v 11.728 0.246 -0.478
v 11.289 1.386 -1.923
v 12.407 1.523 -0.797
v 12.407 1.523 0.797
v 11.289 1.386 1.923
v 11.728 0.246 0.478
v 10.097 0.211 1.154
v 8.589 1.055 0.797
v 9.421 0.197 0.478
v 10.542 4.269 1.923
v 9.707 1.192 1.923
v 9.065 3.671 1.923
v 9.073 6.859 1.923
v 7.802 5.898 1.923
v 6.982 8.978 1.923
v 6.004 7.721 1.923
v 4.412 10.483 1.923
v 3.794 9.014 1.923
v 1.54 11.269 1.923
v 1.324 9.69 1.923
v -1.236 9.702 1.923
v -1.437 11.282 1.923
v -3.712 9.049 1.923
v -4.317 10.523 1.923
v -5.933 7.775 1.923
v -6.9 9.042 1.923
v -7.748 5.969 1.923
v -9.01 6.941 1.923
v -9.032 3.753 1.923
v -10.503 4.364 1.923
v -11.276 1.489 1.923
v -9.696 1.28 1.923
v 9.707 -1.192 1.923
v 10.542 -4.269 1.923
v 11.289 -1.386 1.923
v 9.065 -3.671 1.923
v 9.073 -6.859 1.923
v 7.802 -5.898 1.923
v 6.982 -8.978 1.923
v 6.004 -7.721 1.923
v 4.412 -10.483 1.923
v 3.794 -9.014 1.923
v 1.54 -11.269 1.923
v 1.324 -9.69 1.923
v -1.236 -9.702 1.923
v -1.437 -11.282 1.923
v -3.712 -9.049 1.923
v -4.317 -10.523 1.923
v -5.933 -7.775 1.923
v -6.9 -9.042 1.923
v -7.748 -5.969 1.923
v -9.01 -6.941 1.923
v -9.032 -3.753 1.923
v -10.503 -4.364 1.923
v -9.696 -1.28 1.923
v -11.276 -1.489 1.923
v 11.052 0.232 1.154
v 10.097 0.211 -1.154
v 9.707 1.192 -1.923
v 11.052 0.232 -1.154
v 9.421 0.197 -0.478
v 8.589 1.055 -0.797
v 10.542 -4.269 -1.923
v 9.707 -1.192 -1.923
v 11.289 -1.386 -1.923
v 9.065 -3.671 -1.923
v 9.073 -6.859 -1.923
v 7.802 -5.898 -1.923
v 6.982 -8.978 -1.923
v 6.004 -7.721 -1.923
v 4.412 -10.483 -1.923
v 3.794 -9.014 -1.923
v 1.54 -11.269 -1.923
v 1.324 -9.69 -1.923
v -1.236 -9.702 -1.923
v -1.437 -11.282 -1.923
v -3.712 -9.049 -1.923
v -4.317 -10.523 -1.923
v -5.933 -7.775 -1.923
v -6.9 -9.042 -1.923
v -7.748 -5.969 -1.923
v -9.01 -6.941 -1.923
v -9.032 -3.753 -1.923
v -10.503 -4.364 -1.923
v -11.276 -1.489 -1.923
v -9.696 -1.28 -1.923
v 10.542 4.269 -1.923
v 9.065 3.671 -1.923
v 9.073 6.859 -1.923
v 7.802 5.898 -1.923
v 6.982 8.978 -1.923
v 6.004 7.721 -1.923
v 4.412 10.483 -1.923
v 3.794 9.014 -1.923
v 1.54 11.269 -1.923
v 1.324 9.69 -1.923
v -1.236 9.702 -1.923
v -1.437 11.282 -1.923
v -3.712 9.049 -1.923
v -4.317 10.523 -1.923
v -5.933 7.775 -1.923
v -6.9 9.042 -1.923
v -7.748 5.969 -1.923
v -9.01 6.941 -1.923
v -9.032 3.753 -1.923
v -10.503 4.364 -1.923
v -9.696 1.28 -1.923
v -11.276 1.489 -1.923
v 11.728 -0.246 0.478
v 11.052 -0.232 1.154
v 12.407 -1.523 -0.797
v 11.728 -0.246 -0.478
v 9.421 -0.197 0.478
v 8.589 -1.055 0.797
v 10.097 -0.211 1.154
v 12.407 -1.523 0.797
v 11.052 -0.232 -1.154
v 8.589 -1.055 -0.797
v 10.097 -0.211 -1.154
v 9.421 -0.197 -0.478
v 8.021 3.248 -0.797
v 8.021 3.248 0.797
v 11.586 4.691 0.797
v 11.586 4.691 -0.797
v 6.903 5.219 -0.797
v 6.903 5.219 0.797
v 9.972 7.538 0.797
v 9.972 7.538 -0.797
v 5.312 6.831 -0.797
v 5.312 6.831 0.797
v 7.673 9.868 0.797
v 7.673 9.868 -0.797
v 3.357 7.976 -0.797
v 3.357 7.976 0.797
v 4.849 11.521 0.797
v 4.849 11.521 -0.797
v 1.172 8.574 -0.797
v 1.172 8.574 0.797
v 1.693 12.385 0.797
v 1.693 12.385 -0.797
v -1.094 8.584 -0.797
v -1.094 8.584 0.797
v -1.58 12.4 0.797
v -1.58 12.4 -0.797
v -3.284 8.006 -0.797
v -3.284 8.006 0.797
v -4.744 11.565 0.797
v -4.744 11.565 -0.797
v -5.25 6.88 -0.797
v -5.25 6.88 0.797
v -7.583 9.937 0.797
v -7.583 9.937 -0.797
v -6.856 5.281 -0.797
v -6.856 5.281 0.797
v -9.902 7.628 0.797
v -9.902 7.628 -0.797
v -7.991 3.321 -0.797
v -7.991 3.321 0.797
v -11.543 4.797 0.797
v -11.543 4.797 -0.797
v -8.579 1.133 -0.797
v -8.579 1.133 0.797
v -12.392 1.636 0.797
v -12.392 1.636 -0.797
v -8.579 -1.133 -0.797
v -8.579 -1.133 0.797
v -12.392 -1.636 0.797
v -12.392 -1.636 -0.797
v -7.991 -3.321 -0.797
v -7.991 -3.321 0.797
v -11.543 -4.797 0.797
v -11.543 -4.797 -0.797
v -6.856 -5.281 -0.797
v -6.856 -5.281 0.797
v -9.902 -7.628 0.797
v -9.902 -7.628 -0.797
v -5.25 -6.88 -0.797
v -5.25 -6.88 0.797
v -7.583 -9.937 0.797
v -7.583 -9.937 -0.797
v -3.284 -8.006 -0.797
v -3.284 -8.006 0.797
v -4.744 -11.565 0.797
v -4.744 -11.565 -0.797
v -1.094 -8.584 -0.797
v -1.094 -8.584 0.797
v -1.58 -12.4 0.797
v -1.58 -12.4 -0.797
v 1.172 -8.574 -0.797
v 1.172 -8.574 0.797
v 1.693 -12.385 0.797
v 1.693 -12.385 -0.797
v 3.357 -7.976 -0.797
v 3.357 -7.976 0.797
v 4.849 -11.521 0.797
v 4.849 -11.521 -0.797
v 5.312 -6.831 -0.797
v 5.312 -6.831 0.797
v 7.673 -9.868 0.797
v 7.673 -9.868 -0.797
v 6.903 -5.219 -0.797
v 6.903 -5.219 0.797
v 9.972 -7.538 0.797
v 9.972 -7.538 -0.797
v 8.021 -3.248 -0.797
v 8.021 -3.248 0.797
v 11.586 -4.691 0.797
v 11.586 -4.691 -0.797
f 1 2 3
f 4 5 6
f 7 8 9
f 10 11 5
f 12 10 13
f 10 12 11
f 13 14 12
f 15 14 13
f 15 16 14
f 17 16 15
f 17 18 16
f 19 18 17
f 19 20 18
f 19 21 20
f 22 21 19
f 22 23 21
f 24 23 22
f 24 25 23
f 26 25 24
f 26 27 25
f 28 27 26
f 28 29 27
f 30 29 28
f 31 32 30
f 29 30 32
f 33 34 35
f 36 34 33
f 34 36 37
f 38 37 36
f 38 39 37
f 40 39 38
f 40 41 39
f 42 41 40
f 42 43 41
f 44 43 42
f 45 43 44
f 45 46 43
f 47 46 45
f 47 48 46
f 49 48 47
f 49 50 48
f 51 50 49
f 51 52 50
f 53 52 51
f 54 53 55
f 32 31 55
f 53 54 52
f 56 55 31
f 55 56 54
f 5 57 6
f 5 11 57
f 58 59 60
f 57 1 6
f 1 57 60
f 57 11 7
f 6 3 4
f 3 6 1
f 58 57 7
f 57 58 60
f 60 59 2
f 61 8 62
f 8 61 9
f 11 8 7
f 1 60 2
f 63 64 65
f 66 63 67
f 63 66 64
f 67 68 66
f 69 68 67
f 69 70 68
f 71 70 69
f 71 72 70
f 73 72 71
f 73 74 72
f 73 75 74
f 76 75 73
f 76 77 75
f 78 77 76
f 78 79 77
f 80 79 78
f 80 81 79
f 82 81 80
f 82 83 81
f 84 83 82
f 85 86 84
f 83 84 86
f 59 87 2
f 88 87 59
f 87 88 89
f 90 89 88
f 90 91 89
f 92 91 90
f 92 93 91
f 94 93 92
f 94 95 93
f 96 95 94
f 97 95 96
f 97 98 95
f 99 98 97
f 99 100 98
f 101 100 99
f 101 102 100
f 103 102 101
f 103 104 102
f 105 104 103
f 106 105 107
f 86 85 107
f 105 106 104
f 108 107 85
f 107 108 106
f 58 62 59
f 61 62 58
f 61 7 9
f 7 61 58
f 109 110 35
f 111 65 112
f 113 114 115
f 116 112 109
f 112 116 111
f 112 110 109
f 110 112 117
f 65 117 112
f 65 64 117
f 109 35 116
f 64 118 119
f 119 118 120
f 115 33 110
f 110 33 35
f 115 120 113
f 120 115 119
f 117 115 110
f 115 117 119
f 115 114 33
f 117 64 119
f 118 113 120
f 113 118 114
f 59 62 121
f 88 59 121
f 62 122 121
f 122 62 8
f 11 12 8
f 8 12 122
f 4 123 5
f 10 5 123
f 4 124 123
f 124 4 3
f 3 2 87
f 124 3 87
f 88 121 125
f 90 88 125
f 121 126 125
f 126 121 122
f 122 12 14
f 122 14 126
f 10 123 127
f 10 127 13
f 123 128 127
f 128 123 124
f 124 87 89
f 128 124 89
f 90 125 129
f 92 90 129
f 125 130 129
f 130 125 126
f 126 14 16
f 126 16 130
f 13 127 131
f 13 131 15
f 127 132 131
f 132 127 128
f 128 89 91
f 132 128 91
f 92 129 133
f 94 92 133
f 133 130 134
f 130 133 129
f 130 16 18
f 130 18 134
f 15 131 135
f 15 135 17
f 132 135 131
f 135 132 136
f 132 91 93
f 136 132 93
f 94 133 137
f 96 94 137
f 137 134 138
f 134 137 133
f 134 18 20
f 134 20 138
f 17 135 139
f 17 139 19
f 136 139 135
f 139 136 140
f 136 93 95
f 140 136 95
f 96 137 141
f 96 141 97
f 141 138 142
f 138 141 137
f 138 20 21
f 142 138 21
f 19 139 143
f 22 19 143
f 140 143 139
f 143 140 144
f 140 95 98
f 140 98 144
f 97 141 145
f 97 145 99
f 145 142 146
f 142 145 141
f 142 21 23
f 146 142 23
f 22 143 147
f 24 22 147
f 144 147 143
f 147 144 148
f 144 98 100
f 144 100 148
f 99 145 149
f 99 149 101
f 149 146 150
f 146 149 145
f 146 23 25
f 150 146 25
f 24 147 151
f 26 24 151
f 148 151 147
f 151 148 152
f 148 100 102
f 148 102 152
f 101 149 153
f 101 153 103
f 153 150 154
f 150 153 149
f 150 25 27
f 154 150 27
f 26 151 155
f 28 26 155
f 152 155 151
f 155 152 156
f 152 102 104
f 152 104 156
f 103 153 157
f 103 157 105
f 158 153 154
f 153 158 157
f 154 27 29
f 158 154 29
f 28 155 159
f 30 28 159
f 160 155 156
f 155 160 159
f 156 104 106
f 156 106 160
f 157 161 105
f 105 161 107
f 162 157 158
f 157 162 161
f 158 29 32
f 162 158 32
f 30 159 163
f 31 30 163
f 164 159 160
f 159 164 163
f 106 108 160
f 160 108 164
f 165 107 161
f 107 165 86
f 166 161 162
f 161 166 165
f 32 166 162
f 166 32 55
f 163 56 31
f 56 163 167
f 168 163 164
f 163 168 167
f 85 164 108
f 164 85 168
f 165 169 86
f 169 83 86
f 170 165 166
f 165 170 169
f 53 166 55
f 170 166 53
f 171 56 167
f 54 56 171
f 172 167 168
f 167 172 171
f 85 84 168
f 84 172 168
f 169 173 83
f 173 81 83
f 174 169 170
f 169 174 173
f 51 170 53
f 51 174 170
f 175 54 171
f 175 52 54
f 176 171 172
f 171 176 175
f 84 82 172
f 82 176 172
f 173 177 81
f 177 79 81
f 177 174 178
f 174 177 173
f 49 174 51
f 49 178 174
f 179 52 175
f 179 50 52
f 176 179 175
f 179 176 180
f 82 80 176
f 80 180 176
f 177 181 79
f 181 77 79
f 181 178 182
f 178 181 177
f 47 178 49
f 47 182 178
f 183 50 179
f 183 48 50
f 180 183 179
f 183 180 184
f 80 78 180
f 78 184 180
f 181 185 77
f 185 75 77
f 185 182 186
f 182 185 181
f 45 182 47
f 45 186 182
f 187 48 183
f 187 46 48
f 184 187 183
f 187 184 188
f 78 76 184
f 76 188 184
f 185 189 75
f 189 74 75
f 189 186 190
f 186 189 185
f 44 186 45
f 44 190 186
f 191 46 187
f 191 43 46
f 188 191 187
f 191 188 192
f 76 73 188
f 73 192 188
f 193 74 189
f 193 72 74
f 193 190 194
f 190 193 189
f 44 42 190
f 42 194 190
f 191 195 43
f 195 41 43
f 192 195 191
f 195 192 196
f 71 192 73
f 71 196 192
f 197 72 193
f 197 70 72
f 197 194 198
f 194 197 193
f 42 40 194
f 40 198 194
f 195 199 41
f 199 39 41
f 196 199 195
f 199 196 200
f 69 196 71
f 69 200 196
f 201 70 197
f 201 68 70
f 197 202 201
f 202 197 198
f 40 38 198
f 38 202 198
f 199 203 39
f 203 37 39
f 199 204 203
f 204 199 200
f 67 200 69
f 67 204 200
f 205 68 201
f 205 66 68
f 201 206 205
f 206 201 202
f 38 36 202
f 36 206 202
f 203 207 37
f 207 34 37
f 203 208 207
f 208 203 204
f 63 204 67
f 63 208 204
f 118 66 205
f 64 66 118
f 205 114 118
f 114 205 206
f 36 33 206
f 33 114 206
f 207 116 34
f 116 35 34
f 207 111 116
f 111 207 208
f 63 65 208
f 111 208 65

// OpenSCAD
module octagon_2d(gauge) {
  intersection_for(a = [0, 45])
    rotate([0, 0, a])
      square(gauge, center=true);
}

module torus(od, aspect_ratio) {
  gauge = od / (aspect_ratio + 2);
  gap_angle = 7;
  
  rotate([0, 0, gap_angle])
    rotate_extrude($fn=24, angle=360-2*gap_angle)
      translate([od/2-gauge/2, 0])
        octagon_2d(gauge);
  
  for (a = [-1, 1])
    scale([1, a, 1])
      hull()
        for (packet = [[1.2, 0.6], [gap_angle, 1]])
          rotate([0, 0, -packet[0]])
            translate([od/2-gauge/2, 0])
              rotate([90, 0, 0])
                linear_extrude(0.0001)
                  scale(packet[1])
                    octagon_2d(gauge);
}


module ring() {
  torus(25, 4.5);
}

ring();
